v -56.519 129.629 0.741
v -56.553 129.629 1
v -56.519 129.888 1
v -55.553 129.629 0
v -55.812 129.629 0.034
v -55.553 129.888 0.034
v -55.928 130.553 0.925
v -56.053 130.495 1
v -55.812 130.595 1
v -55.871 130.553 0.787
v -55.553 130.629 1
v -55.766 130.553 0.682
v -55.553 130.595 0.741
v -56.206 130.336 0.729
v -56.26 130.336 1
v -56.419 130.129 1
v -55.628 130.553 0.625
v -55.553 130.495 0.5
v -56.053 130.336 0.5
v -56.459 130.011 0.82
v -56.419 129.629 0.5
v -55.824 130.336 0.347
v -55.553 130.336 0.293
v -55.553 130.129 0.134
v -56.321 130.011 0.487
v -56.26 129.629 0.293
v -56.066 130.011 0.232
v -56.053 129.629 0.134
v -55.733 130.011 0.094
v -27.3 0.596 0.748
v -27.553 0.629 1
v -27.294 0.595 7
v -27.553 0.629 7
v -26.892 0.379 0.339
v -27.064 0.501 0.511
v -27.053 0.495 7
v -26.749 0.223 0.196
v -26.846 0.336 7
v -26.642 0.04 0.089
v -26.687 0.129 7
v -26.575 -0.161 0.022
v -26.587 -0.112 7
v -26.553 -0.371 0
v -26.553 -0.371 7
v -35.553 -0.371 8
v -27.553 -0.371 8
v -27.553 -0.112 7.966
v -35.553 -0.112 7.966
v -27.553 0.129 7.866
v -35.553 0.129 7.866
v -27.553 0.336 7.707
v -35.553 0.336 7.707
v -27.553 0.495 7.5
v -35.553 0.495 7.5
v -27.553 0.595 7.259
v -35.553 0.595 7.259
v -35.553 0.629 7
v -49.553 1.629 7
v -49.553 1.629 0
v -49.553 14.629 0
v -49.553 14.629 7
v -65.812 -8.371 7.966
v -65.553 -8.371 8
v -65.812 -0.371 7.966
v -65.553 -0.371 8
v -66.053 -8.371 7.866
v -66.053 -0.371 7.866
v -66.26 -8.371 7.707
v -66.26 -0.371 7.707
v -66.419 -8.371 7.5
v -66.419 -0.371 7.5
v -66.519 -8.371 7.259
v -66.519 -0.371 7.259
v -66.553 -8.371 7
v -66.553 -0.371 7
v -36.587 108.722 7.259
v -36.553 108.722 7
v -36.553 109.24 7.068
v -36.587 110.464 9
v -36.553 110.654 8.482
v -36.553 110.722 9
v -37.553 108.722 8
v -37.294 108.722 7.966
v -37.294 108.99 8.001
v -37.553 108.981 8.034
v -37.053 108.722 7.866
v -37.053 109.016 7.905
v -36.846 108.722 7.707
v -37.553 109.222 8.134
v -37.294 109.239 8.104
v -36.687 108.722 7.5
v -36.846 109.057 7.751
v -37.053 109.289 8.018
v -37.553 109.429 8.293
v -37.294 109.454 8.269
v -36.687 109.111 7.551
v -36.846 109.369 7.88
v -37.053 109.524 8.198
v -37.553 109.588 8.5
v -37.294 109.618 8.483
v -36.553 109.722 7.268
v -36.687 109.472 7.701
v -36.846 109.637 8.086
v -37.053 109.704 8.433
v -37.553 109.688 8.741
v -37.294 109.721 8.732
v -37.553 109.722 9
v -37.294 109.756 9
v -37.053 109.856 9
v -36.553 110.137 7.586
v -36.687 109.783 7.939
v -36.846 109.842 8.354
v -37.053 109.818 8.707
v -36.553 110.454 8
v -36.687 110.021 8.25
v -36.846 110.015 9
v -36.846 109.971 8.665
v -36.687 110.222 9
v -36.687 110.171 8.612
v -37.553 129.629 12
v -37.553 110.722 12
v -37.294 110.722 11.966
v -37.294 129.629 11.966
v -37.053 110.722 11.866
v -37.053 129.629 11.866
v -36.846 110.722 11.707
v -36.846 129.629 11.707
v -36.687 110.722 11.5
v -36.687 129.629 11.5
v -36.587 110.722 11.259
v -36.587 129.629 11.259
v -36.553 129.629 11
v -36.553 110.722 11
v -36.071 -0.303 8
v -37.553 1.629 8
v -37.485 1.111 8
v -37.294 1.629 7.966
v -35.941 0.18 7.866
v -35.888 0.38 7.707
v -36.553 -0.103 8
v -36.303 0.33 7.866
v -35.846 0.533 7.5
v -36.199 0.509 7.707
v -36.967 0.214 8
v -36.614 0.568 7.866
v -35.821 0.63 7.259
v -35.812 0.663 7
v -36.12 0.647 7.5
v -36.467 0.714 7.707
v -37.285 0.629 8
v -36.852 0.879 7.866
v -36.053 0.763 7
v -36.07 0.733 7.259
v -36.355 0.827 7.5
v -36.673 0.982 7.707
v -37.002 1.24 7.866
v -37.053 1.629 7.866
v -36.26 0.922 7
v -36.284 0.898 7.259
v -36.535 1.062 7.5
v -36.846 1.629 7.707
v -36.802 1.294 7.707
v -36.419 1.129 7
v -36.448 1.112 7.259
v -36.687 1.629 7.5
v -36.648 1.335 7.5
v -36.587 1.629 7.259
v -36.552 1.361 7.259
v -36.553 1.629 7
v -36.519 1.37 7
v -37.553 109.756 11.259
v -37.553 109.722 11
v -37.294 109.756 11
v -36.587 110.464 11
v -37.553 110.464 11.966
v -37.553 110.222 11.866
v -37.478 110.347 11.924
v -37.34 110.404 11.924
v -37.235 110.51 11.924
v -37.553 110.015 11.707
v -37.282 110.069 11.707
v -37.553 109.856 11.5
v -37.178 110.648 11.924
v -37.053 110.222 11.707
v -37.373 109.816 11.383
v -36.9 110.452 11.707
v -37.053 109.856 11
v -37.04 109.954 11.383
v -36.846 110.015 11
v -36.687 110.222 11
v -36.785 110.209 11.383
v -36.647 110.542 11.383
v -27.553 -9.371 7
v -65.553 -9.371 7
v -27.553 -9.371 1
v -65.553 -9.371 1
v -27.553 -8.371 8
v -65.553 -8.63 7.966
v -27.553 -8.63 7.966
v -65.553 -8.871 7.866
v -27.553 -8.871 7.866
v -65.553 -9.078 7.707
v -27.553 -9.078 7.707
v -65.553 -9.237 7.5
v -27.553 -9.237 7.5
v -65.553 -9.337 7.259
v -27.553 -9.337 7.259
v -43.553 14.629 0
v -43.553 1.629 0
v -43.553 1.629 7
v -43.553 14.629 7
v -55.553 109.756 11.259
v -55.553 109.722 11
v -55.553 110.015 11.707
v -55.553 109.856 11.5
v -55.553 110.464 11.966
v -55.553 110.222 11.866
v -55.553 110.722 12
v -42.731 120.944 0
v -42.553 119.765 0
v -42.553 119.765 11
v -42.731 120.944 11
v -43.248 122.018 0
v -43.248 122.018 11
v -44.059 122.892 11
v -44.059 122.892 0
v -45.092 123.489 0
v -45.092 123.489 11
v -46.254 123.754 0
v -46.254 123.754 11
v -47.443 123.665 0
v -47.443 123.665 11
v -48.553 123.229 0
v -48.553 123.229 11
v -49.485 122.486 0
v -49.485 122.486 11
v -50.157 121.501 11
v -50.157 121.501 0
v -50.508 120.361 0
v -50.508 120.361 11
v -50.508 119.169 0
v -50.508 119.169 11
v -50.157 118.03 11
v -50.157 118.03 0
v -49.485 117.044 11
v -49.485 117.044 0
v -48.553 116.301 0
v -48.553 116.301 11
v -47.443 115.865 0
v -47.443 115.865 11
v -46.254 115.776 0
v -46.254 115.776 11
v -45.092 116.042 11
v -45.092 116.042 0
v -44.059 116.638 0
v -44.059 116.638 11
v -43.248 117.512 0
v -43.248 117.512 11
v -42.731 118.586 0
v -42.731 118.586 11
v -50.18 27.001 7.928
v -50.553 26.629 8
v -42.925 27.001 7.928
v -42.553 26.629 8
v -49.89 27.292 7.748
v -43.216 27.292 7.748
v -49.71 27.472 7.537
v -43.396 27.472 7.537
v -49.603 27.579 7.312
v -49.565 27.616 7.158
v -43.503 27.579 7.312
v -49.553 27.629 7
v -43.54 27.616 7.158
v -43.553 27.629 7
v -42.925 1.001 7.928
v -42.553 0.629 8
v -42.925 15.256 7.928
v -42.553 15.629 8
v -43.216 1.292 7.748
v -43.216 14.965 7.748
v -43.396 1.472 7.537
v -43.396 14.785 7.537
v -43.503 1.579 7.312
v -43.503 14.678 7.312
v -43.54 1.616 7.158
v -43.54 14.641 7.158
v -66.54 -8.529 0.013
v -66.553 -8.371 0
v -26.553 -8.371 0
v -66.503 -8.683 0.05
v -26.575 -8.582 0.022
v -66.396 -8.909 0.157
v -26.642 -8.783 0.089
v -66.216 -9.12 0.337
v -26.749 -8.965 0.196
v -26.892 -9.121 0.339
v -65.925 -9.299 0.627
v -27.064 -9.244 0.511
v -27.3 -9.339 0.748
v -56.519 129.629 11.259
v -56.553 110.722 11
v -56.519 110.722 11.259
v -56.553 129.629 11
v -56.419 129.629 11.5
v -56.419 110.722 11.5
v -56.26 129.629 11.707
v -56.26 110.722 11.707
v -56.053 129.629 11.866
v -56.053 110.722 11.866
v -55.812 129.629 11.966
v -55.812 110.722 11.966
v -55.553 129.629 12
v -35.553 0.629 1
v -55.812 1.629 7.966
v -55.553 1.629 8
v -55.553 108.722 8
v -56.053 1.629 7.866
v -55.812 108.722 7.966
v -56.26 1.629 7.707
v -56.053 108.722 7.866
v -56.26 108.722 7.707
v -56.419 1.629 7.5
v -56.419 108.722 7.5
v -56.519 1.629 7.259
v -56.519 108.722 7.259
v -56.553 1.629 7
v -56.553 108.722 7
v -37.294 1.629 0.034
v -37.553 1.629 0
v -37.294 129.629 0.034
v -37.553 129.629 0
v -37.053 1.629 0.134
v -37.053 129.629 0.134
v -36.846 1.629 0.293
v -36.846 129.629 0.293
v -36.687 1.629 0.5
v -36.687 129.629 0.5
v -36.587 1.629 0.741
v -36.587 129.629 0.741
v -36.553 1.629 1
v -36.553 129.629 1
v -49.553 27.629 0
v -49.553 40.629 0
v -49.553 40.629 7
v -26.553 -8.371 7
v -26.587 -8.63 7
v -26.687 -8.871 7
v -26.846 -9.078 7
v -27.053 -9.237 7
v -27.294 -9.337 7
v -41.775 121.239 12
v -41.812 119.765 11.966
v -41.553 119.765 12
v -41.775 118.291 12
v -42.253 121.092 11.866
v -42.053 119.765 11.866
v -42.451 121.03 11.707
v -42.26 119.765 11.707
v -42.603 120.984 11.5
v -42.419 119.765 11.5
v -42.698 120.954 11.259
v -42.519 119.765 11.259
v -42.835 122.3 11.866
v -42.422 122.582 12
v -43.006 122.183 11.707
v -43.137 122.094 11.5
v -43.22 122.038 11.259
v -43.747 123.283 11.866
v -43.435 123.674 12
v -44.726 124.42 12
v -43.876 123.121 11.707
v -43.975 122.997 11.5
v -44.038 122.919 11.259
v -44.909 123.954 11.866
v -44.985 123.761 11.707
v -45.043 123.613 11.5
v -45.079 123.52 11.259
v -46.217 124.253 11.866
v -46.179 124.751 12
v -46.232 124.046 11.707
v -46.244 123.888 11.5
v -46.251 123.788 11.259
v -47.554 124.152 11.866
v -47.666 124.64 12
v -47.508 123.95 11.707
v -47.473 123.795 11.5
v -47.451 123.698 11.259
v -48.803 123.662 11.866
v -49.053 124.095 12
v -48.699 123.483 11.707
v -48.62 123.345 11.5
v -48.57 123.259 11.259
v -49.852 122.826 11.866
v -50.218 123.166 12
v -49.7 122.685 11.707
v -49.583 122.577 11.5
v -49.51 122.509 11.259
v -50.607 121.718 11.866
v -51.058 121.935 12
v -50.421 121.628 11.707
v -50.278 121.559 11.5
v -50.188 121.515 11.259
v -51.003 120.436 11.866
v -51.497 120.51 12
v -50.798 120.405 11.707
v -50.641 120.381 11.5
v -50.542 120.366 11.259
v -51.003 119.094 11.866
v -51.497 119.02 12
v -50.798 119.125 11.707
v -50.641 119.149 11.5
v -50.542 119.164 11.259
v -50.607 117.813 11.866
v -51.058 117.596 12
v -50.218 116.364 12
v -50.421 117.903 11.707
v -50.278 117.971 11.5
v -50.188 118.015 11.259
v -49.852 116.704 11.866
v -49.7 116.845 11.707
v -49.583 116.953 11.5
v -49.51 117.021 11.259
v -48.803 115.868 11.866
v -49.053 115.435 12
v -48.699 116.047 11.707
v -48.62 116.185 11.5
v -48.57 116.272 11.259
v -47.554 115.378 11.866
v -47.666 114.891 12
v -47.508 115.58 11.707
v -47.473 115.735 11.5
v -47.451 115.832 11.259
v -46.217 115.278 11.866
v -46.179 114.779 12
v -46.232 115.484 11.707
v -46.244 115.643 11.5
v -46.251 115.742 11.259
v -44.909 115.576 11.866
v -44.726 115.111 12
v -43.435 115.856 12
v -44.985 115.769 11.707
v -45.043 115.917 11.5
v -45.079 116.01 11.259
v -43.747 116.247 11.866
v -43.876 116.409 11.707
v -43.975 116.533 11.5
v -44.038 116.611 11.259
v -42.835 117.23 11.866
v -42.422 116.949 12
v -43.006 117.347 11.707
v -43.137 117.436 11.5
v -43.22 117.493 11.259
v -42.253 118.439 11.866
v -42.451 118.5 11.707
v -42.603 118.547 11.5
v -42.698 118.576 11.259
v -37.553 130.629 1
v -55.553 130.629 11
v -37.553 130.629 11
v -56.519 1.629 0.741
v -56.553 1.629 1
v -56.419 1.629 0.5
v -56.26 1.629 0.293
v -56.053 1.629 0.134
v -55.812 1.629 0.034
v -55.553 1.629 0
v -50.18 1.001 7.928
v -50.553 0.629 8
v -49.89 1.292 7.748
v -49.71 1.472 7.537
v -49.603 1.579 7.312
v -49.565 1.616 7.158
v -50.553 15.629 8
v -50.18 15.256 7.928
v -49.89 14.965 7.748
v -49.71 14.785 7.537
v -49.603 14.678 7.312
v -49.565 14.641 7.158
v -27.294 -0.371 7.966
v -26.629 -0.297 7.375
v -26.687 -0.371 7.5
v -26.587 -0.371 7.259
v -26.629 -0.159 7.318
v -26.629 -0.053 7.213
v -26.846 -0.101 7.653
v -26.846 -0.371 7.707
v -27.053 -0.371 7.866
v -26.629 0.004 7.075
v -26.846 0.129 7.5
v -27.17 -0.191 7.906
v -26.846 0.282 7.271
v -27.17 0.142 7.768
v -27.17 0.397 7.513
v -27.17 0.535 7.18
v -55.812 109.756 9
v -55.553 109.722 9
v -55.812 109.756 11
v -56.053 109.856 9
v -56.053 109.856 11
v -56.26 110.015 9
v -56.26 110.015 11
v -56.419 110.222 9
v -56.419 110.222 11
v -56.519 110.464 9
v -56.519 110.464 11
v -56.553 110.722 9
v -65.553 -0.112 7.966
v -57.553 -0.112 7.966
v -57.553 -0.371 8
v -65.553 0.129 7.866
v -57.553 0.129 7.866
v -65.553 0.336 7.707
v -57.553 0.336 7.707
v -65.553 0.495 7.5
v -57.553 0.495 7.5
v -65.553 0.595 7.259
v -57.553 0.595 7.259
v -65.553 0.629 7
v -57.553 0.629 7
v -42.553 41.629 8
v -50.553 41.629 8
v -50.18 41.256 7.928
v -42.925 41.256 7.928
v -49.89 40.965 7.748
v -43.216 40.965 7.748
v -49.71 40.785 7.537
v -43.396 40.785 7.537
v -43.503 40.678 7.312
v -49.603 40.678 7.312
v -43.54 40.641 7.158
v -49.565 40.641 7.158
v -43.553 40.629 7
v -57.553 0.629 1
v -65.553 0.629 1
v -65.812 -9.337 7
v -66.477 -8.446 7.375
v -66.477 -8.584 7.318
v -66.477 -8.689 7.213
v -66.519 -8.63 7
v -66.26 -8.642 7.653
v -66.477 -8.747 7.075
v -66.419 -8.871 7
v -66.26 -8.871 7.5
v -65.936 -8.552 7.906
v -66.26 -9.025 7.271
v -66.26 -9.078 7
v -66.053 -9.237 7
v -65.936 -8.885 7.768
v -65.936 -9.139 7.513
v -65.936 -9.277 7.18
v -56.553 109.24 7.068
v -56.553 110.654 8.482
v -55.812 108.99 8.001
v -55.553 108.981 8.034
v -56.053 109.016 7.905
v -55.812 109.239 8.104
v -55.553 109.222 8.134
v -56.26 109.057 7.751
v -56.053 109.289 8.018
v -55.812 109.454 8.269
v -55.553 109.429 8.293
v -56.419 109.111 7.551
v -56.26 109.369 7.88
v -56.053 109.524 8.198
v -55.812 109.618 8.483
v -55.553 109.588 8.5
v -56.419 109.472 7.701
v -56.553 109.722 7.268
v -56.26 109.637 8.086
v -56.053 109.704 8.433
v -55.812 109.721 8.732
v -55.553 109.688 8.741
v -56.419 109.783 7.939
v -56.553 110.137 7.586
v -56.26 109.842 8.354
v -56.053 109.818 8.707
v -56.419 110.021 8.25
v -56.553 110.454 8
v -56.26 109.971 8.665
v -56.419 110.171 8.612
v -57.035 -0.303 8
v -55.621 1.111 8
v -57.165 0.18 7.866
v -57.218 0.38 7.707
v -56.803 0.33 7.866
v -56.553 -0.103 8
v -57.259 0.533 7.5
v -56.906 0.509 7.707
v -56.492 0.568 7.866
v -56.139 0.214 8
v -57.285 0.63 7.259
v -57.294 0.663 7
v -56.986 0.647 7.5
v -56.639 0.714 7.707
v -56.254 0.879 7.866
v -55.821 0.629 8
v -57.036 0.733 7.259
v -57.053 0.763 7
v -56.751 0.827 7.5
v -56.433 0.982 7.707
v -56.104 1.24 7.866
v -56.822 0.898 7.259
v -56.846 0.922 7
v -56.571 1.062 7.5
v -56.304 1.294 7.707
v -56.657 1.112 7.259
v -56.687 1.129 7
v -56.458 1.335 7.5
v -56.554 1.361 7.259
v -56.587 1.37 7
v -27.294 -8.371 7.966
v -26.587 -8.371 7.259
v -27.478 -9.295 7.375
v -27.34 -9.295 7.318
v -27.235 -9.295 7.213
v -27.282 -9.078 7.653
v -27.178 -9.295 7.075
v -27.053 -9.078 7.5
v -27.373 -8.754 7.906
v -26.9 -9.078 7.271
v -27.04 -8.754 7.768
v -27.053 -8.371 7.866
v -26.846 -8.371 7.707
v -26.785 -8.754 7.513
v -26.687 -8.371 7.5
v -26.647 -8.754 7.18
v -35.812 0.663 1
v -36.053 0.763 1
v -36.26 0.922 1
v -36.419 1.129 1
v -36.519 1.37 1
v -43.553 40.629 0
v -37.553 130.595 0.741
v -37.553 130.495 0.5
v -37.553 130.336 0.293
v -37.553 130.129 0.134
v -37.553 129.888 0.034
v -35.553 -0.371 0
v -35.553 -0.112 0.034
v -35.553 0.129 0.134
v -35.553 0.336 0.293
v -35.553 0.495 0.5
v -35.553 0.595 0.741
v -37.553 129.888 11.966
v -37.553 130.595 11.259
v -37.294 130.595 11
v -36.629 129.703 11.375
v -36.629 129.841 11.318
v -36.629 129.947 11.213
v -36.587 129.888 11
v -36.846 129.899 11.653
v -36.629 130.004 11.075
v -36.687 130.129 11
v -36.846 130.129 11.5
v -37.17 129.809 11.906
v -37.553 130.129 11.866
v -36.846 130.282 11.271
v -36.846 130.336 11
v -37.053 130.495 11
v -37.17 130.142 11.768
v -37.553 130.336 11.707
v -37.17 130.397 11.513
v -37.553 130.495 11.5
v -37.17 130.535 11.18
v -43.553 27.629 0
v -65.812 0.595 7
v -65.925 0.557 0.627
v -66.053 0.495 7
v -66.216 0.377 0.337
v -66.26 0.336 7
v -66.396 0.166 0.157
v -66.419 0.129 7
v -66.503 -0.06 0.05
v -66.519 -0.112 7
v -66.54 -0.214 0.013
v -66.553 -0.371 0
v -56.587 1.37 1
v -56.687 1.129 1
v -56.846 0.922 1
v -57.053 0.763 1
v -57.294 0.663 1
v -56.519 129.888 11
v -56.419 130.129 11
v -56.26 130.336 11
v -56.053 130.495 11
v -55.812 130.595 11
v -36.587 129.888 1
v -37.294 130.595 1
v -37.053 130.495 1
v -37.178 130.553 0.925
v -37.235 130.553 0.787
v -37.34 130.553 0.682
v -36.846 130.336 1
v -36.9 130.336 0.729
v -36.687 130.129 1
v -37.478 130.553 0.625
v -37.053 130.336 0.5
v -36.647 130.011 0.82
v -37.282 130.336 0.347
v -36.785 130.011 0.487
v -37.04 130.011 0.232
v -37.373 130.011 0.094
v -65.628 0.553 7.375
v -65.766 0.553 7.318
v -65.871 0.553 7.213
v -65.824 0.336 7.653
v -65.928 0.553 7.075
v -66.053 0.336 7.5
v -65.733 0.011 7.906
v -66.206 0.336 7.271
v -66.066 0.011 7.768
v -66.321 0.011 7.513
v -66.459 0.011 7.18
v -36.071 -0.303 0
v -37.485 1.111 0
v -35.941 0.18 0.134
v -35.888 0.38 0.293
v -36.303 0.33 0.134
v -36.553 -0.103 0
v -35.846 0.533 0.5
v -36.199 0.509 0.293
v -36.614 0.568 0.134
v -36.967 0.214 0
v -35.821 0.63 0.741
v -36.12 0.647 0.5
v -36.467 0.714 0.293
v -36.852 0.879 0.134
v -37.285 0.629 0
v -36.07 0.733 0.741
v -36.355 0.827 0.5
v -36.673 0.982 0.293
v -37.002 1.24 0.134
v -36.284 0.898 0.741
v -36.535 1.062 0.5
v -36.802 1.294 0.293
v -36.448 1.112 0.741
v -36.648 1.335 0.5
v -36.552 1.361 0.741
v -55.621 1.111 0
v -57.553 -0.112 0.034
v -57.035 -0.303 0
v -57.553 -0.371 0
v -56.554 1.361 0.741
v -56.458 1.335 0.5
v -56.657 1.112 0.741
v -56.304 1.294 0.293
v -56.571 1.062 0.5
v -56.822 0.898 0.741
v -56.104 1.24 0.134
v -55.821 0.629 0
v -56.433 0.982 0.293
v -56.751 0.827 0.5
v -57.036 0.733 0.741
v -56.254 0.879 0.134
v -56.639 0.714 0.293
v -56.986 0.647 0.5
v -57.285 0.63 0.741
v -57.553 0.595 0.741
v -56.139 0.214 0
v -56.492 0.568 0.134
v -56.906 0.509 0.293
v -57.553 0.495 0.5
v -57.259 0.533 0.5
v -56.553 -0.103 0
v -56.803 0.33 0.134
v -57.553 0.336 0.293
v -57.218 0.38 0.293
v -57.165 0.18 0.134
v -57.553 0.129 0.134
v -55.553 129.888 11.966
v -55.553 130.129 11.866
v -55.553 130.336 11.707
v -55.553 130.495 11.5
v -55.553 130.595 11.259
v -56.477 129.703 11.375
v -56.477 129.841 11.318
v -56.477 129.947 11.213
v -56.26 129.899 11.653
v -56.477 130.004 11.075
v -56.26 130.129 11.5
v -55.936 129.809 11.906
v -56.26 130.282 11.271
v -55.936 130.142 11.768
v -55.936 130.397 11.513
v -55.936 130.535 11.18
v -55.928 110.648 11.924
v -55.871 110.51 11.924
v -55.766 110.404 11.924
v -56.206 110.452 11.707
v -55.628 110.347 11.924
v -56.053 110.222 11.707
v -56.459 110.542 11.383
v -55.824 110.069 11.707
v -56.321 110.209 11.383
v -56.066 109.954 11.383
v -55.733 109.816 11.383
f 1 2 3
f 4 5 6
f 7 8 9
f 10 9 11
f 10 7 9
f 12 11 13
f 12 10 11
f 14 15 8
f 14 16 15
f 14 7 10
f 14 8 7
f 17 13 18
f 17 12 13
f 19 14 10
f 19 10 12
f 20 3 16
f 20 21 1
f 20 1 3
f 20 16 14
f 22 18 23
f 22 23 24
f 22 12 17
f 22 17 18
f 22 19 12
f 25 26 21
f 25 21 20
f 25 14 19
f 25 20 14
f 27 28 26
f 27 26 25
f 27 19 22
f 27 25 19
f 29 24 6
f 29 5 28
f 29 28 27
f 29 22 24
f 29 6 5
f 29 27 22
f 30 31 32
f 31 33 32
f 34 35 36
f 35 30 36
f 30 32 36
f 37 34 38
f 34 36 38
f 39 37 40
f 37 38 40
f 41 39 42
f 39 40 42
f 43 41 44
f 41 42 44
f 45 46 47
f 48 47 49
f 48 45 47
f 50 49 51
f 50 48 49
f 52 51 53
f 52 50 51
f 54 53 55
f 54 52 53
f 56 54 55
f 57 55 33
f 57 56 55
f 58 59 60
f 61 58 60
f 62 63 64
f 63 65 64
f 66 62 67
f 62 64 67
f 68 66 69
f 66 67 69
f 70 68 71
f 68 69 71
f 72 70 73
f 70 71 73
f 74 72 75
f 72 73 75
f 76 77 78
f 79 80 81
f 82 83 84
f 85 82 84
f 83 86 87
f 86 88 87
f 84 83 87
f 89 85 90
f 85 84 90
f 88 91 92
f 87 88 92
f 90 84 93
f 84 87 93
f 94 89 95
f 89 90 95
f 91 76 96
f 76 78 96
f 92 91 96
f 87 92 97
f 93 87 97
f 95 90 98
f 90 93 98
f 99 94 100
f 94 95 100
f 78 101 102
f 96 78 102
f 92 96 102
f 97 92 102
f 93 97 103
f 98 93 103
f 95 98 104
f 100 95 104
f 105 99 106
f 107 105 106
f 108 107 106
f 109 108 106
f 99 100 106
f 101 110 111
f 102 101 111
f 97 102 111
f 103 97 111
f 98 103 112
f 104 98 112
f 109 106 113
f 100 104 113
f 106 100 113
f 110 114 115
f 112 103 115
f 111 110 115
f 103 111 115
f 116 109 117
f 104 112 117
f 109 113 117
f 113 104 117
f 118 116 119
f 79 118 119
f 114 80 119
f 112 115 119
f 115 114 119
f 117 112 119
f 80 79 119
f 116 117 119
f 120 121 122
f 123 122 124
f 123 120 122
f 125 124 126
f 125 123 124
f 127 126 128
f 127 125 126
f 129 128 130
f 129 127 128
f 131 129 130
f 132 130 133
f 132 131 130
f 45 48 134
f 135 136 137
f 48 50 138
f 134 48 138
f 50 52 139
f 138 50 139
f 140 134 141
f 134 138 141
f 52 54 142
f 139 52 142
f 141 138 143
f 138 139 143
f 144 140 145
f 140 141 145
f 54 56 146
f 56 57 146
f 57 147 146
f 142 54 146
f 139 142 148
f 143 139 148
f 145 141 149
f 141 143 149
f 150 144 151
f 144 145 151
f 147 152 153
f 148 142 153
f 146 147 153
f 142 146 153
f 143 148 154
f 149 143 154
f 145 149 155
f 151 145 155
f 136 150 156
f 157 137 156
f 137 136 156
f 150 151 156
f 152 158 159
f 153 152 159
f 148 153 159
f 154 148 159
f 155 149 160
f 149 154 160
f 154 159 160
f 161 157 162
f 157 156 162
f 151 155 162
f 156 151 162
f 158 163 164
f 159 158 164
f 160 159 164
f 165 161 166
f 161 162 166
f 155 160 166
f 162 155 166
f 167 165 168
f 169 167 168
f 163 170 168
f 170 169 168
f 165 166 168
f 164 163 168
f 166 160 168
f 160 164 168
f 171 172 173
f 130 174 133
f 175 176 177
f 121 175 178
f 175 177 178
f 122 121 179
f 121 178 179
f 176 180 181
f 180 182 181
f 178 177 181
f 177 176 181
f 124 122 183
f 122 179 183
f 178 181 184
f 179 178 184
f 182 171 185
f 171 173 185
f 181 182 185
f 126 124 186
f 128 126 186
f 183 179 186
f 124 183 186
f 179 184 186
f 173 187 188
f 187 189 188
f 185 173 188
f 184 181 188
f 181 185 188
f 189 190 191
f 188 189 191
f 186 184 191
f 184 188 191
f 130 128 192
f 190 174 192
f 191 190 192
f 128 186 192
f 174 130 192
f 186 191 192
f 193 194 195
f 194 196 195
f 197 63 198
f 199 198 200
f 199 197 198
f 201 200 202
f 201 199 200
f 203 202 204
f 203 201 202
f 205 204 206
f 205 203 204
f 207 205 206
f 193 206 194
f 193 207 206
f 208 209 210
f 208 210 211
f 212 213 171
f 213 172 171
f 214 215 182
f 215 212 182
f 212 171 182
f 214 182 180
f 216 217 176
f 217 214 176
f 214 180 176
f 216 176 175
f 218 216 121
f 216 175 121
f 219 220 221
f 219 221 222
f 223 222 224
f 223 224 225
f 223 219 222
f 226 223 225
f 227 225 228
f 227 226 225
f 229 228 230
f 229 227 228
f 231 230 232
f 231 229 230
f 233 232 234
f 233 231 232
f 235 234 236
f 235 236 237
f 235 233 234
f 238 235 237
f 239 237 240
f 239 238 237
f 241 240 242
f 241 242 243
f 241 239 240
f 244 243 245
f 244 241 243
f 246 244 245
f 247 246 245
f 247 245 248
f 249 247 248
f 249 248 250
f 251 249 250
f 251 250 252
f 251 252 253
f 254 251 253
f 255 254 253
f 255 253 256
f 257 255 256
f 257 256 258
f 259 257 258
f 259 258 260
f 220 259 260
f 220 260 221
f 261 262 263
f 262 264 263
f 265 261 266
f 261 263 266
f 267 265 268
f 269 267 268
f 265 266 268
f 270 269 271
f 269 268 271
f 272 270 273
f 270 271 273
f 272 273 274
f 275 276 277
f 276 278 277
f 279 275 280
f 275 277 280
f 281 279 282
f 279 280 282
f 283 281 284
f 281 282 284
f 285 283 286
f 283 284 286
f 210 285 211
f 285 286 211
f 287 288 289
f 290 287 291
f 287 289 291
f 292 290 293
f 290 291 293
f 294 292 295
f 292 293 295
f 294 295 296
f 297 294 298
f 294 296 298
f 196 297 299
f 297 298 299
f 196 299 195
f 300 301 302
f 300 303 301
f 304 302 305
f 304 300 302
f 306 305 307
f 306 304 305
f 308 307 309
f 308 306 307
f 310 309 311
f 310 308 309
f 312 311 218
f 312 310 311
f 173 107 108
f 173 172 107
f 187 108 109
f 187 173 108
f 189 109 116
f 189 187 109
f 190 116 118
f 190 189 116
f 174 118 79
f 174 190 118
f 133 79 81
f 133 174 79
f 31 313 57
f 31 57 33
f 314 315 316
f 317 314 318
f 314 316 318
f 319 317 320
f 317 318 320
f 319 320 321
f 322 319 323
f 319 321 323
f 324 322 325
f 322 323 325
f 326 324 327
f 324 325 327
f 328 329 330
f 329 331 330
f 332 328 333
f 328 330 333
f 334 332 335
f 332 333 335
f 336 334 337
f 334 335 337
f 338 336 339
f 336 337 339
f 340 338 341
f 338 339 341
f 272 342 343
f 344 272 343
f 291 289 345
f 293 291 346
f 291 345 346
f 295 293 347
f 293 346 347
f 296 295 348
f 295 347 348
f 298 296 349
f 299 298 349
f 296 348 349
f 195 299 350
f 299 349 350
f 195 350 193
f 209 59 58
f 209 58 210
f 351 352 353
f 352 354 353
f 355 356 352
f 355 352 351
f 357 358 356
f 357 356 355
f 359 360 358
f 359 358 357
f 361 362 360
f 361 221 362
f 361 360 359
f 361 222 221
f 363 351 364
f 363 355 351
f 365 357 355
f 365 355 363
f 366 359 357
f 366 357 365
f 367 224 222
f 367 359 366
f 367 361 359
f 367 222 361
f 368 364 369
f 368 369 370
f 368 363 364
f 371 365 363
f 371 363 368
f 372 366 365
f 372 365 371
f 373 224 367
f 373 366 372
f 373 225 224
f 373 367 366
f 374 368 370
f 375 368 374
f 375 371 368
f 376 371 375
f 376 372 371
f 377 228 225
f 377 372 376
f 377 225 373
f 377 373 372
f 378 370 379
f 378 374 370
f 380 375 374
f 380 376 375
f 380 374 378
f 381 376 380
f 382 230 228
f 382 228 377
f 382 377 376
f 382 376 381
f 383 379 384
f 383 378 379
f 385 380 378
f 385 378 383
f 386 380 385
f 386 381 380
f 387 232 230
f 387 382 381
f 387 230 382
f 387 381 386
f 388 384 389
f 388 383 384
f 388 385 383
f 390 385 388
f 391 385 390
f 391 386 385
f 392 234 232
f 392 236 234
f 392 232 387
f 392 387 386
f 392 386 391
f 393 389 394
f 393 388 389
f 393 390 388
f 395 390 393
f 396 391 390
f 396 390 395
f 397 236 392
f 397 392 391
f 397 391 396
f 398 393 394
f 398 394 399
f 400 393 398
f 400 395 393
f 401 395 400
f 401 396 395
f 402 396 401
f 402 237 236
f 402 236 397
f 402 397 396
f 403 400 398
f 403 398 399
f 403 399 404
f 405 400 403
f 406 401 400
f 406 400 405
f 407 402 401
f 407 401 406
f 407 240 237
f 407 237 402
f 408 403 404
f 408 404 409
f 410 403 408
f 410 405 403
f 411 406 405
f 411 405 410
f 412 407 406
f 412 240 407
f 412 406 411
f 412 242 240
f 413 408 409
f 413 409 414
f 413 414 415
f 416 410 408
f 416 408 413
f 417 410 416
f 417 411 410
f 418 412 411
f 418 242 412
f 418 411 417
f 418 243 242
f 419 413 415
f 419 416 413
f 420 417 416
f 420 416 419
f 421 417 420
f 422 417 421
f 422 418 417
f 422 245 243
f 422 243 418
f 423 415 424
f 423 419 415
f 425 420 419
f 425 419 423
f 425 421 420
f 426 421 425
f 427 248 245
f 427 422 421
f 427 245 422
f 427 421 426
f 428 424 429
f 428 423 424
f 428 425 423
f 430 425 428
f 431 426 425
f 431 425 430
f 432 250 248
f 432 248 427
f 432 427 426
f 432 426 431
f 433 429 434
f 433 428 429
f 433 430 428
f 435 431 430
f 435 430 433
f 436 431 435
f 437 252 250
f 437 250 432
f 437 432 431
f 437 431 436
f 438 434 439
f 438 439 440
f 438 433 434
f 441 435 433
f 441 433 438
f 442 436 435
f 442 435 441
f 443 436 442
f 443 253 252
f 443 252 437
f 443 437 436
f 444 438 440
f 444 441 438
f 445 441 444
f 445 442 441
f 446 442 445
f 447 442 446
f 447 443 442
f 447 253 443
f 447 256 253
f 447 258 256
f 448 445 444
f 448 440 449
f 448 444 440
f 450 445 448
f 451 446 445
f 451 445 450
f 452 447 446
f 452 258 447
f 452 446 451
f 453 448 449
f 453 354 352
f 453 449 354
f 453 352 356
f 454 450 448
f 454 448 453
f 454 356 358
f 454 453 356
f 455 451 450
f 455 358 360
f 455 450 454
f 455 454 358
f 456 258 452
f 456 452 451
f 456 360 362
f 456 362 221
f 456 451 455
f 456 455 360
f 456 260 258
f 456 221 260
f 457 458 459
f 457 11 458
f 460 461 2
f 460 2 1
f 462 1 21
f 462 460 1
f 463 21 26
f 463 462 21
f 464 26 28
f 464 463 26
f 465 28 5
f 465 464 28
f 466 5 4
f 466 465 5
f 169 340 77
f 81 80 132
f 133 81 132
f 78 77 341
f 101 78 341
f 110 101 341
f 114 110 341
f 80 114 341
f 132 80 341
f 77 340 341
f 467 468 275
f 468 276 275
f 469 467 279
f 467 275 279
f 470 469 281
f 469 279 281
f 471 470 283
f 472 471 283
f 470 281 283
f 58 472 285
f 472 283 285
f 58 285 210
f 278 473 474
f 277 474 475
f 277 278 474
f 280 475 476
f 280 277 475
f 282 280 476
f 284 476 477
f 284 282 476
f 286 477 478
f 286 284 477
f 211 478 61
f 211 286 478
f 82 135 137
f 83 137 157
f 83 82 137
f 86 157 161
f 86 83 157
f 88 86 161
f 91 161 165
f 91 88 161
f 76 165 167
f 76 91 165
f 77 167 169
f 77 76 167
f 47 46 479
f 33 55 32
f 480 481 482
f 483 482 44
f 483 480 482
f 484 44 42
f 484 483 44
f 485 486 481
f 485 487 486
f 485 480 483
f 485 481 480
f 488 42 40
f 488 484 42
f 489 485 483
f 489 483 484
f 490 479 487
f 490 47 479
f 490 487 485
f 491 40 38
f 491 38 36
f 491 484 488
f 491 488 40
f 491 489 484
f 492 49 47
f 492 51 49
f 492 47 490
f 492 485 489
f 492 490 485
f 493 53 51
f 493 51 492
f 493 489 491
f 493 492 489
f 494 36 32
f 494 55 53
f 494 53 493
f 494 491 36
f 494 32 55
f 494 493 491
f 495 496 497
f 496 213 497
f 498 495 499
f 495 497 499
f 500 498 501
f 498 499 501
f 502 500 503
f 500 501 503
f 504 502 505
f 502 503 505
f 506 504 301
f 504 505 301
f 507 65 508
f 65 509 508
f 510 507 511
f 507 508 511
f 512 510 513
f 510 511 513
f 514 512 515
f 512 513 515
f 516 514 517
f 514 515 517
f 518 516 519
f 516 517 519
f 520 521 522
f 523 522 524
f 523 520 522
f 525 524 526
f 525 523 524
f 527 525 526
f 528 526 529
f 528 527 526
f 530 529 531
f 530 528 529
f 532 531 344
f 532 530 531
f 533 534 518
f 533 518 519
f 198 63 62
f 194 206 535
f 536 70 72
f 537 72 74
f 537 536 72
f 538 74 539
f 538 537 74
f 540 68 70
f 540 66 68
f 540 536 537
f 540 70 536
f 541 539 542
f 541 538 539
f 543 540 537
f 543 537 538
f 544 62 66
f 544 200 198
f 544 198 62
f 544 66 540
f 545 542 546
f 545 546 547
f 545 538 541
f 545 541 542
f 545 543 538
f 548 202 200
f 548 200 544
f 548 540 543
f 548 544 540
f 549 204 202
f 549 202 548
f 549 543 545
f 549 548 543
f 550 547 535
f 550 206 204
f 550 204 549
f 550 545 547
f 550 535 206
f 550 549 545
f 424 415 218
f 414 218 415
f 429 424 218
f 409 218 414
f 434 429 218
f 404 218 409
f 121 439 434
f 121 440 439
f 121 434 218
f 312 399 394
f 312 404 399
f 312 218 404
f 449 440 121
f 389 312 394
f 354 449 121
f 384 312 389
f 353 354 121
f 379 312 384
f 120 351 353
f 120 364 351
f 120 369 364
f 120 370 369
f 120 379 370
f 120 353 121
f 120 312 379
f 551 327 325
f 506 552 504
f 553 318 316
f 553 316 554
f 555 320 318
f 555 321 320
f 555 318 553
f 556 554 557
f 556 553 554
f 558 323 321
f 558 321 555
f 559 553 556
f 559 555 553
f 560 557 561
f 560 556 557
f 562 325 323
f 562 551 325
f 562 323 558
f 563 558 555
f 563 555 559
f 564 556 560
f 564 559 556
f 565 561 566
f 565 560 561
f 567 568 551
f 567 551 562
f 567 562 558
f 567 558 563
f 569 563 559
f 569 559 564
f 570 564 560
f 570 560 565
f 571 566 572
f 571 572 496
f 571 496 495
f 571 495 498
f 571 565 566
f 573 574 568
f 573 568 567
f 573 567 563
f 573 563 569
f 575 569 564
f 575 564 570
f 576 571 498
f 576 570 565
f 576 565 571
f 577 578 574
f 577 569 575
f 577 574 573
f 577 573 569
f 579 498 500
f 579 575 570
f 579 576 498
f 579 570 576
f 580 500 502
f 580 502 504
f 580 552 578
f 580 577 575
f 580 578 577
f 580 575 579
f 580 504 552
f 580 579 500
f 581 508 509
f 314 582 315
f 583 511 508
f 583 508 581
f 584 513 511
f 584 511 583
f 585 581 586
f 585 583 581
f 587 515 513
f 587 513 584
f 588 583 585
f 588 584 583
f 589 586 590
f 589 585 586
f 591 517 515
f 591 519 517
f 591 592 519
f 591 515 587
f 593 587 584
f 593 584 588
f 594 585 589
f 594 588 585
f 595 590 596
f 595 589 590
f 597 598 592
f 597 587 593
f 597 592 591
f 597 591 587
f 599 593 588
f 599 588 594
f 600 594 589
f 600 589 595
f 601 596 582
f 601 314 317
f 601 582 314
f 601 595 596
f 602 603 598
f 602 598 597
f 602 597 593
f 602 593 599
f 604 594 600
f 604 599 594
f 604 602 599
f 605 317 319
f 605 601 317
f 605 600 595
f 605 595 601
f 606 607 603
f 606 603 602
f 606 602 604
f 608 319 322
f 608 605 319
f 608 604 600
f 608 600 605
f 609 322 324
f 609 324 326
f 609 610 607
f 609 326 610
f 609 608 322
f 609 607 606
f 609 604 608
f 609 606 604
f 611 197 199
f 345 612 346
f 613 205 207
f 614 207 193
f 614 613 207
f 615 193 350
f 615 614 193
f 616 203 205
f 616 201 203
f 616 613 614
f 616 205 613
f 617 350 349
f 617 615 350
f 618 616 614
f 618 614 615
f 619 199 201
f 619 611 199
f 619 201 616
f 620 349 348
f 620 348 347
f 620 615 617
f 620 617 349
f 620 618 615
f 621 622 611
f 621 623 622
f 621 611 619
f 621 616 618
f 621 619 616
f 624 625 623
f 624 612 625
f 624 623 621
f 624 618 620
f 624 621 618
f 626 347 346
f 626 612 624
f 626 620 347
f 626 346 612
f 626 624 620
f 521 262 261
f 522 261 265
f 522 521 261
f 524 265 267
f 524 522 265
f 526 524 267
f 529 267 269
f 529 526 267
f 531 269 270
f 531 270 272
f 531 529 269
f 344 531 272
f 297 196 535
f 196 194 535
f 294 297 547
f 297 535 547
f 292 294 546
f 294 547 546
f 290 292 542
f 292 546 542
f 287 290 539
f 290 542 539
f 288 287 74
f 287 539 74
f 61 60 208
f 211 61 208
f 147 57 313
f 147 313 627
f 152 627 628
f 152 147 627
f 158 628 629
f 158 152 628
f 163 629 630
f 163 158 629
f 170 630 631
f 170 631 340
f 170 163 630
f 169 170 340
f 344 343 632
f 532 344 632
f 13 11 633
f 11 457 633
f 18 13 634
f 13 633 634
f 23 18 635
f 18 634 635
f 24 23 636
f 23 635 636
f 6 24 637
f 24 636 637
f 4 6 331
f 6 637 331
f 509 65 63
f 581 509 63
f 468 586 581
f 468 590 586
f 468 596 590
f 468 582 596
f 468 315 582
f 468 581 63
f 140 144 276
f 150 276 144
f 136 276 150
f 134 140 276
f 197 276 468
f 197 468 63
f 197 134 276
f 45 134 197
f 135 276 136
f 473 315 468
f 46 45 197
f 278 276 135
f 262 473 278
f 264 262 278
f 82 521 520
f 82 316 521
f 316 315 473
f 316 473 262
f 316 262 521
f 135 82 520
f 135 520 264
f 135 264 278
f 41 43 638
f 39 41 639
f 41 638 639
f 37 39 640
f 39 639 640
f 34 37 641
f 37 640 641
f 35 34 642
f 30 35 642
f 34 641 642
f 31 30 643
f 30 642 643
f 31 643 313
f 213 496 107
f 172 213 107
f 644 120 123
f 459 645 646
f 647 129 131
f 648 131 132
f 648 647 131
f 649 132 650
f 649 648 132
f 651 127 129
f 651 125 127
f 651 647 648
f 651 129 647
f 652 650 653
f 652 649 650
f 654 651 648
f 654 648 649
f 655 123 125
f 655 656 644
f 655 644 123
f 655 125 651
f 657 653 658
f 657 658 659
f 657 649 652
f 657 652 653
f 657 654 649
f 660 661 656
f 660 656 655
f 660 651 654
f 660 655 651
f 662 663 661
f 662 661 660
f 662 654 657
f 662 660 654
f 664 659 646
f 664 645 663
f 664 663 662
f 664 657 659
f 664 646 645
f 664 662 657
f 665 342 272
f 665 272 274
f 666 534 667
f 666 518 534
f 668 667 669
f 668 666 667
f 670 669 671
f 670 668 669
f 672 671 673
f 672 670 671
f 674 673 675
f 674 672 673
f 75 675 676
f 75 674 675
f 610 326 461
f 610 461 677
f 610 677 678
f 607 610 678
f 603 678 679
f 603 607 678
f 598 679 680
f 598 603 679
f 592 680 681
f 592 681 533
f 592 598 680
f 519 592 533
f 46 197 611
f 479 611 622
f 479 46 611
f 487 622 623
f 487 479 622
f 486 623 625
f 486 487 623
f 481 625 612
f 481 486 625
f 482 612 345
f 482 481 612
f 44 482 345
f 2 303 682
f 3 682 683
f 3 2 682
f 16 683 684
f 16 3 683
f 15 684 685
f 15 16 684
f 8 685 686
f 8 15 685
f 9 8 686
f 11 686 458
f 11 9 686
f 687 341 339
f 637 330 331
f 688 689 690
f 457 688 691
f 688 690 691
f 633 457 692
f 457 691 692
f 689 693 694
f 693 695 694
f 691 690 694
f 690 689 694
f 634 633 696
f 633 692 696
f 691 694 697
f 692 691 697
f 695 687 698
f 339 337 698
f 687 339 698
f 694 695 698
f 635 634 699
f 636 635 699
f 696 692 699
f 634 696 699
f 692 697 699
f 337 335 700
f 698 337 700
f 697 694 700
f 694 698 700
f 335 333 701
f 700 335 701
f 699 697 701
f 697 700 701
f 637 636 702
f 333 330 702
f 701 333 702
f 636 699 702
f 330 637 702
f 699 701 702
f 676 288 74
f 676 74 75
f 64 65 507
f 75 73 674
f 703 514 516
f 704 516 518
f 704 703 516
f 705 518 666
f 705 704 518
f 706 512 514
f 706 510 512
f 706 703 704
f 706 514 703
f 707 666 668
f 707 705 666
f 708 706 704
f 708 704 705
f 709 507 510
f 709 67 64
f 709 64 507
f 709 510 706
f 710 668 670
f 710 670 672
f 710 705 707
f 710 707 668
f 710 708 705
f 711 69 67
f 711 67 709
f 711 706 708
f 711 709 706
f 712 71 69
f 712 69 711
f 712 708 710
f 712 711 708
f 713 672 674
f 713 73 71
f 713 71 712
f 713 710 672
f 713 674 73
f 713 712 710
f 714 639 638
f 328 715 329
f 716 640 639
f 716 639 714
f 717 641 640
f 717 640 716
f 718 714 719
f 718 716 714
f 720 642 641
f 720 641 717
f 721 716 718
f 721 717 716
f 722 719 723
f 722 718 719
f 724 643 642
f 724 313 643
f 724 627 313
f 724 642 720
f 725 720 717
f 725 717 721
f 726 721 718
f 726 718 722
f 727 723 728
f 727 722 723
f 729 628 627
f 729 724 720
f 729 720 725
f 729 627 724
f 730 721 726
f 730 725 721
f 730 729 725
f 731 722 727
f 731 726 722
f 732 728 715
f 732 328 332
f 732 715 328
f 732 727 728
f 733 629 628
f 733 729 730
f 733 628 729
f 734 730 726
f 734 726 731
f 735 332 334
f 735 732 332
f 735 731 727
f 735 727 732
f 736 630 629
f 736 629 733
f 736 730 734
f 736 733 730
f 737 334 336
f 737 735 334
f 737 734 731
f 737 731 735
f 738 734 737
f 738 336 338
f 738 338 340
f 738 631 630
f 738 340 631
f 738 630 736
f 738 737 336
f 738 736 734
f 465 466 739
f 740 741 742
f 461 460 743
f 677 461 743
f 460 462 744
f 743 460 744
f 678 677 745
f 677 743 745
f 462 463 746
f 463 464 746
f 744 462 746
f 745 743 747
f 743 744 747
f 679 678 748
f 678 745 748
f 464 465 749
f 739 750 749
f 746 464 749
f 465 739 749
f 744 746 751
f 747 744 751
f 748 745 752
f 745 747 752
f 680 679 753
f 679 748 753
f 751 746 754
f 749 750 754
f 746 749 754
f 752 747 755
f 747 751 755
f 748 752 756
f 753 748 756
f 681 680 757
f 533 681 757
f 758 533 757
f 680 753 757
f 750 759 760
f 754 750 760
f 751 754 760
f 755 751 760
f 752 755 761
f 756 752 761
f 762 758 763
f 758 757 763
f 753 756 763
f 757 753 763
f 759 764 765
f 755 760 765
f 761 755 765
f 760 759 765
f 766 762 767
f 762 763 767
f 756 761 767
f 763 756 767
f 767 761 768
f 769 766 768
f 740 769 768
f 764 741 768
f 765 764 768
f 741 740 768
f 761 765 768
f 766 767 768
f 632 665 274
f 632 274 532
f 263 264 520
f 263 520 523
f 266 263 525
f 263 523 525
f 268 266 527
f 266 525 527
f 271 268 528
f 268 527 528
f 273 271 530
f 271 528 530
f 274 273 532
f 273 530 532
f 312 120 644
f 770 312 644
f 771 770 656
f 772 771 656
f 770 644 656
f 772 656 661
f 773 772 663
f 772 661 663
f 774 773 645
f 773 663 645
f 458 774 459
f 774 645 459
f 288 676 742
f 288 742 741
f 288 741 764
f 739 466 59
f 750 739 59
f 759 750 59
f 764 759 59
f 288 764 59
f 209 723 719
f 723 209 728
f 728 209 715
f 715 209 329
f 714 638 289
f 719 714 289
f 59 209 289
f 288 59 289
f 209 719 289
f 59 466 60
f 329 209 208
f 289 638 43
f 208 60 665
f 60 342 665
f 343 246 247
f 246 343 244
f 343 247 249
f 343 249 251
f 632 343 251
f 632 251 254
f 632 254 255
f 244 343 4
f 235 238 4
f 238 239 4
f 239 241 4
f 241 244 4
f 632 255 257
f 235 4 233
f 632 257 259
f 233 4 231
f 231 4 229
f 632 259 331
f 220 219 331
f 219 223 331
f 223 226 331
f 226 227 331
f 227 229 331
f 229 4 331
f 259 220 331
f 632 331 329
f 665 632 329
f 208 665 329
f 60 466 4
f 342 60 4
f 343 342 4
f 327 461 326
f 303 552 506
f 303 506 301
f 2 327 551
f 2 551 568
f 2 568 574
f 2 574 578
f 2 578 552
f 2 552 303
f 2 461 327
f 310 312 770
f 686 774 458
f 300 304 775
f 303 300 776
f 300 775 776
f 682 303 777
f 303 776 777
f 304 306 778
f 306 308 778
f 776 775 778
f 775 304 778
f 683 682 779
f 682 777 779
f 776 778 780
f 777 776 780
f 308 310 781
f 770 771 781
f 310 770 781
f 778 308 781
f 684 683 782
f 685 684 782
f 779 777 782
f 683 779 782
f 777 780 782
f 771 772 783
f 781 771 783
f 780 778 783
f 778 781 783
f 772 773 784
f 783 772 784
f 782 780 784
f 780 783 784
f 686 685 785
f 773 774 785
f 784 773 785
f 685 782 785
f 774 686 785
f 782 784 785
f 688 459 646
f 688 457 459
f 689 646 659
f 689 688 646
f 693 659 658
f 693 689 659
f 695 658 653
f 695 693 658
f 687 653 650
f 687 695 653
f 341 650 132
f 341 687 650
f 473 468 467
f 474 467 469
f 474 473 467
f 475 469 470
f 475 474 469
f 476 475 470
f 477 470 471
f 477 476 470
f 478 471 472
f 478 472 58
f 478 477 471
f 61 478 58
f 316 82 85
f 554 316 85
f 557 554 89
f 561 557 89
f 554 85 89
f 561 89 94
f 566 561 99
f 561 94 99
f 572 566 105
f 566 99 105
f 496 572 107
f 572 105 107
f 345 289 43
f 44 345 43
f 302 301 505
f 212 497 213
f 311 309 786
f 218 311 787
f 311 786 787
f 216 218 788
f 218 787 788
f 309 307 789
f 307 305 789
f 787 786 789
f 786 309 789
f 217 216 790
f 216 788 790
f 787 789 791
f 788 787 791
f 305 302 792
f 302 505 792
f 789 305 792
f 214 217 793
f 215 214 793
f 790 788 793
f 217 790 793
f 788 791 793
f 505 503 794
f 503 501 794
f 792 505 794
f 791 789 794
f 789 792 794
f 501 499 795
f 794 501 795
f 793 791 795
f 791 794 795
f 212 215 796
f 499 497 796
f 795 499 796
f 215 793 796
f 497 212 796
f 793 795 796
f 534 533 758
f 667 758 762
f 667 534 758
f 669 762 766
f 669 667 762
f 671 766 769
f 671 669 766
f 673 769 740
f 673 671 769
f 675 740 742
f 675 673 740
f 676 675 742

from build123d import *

# Parameters (mm, degrees)
F0_W     = 20
F0_H     = 130
F0_W_2   = 6
F0_H_2   = 13
F0_H_3   = 10
F0_W_3   = 10
F1_DEPTH = 8
F2_R     = 4
F3_DEPTH = 50
F2_W     = 20
F2_H     = 20.9063310176
F4_DEPTH = 4
F5_F1_R  = 1
F5_F2_R  = 1


with BuildPart() as f1:
    # F0 (on Top) → F1 (new body)
    with BuildSketch(Plane.XY):
        with Locations((-46.5529351234, 65.628703773)):
            Rectangle(F0_W, F0_H)
        with Locations((-46.5529351234, 8.128703773)):
            Rectangle(F0_W_2, F0_H_2, mode=Mode.SUBTRACT)
        with Locations((-46.5529351234, 34.128703773)):
            Rectangle(F0_W_2, F0_H_2, mode=Mode.SUBTRACT)
        with Locations((-46.5529351234, -4.371296227)):
            Rectangle(F0_W, F0_H_3)
        with Locations((-61.5529351234, -4.371296227)):
            Rectangle(F0_W_3, F0_H_3)
        with Locations((-31.5529351234, -4.371296227)):
            Rectangle(F0_W_3, F0_H_3)
    extrude(amount=F1_DEPTH)

    # F2 (on face) → F3 (cut, symmetric)
    with BuildSketch(Plane.XY.offset(8)):
        with Locations((-46.5529351234, 119.7651425898)):
            Circle(F2_R)
    extrude(amount=F3_DEPTH, both=True, mode=Mode.SUBTRACT)

    # F2 (on face) → F4 (join)
    with BuildSketch(Plane.XY.offset(8)):
        with Locations((-46.5529351234, 120.1755382642)):
            Rectangle(F2_W, F2_H)
        with Locations((-46.5529351234, 119.7651425898)):
            Circle(F2_R, mode=Mode.SUBTRACT)
    extrude(amount=F4_DEPTH)

    # F5: fillet of radius 1 on 35 edges, made by hand

    # F5_f1
    f5_f1_edges = [f1.edges().sort_by_distance(p)[0] for p in [
        (-46.5529351234, 109.7223727554, 8),
        (-36.5529351234, 0.628703773, 4),
        (-56.5529351234, 0.628703773, 4),
    ]]
    fillet(f5_f1_edges, radius=F5_F1_R)

    # F5_f2
    f5_f2_edges = [f1.edges().sort_by_distance(p)[0] for p in [
        (-36.5529351234, 55.1755382642, 8),
        (-31.0529351234, 0.628703773, 8),
        (-26.5529351234, -4.371296227, 8),
        (-46.5529351234, -9.371296227, 8),
        (-66.5529351234, -4.371296227, 8),
        (-62.0529351234, 0.628703773, 8),
        (-56.5529351234, 55.1755382642, 8),
        (-49.5529351234, 8.128703773, 8),
        (-46.5529351234, 1.628703773, 8),
        (-46.5529351234, 14.628703773, 8),
        (-43.5529351234, 8.128703773, 8),
        (-46.5529351234, 40.628703773, 8),
        (-49.5529351234, 34.128703773, 8),
        (-43.5529351234, 34.128703773, 8),
        (-46.5529351234, 27.628703773, 8),
        (-36.5529351234, 66.128703773, 0),
        (-56.5529351234, 66.128703773, 0),
        (-46.5529351234, 130.628703773, 12),
        (-56.5529351234, 120.1755382642, 12),
        (-46.5529351234, 109.7223727554, 12),
        (-36.5529351234, 120.1755382642, 12),
        (-50.5529351234, 119.7651425898, 12),
        (-26.5529351234, 0.628703773, 4),
        (-31.0529351234, 0.628703773, 0),
        (-66.5529351234, 0.628703773, 4),
        (-62.0529351234, 0.628703773, 0),
        (-36.5529351234, 130.628703773, 6),
        (-56.5529351234, 130.628703773, 6),
        (-46.5529351234, 130.628703773, 0),
        (-66.5529351234, -9.371296227, 4),
        (-26.5529351234, -9.371296227, 4),
        (-46.5529351234, -9.371296227, 0),
        (-56.8458283423, 0.9215969918, 0),
        (-36.2600419046, 0.9215969918, 0),
        (-56.5529351234, 109.4294795366, 8.2928932188),
        (-56.8458283423, 0.9215969918, 8),
        (-36.2600419046, 0.9215969918, 8),
        (-36.5529351234, 109.4294795366, 8.2928932188),
    ]]
    fillet(f5_f2_edges, radius=F5_F2_R)


solid = f1.part
